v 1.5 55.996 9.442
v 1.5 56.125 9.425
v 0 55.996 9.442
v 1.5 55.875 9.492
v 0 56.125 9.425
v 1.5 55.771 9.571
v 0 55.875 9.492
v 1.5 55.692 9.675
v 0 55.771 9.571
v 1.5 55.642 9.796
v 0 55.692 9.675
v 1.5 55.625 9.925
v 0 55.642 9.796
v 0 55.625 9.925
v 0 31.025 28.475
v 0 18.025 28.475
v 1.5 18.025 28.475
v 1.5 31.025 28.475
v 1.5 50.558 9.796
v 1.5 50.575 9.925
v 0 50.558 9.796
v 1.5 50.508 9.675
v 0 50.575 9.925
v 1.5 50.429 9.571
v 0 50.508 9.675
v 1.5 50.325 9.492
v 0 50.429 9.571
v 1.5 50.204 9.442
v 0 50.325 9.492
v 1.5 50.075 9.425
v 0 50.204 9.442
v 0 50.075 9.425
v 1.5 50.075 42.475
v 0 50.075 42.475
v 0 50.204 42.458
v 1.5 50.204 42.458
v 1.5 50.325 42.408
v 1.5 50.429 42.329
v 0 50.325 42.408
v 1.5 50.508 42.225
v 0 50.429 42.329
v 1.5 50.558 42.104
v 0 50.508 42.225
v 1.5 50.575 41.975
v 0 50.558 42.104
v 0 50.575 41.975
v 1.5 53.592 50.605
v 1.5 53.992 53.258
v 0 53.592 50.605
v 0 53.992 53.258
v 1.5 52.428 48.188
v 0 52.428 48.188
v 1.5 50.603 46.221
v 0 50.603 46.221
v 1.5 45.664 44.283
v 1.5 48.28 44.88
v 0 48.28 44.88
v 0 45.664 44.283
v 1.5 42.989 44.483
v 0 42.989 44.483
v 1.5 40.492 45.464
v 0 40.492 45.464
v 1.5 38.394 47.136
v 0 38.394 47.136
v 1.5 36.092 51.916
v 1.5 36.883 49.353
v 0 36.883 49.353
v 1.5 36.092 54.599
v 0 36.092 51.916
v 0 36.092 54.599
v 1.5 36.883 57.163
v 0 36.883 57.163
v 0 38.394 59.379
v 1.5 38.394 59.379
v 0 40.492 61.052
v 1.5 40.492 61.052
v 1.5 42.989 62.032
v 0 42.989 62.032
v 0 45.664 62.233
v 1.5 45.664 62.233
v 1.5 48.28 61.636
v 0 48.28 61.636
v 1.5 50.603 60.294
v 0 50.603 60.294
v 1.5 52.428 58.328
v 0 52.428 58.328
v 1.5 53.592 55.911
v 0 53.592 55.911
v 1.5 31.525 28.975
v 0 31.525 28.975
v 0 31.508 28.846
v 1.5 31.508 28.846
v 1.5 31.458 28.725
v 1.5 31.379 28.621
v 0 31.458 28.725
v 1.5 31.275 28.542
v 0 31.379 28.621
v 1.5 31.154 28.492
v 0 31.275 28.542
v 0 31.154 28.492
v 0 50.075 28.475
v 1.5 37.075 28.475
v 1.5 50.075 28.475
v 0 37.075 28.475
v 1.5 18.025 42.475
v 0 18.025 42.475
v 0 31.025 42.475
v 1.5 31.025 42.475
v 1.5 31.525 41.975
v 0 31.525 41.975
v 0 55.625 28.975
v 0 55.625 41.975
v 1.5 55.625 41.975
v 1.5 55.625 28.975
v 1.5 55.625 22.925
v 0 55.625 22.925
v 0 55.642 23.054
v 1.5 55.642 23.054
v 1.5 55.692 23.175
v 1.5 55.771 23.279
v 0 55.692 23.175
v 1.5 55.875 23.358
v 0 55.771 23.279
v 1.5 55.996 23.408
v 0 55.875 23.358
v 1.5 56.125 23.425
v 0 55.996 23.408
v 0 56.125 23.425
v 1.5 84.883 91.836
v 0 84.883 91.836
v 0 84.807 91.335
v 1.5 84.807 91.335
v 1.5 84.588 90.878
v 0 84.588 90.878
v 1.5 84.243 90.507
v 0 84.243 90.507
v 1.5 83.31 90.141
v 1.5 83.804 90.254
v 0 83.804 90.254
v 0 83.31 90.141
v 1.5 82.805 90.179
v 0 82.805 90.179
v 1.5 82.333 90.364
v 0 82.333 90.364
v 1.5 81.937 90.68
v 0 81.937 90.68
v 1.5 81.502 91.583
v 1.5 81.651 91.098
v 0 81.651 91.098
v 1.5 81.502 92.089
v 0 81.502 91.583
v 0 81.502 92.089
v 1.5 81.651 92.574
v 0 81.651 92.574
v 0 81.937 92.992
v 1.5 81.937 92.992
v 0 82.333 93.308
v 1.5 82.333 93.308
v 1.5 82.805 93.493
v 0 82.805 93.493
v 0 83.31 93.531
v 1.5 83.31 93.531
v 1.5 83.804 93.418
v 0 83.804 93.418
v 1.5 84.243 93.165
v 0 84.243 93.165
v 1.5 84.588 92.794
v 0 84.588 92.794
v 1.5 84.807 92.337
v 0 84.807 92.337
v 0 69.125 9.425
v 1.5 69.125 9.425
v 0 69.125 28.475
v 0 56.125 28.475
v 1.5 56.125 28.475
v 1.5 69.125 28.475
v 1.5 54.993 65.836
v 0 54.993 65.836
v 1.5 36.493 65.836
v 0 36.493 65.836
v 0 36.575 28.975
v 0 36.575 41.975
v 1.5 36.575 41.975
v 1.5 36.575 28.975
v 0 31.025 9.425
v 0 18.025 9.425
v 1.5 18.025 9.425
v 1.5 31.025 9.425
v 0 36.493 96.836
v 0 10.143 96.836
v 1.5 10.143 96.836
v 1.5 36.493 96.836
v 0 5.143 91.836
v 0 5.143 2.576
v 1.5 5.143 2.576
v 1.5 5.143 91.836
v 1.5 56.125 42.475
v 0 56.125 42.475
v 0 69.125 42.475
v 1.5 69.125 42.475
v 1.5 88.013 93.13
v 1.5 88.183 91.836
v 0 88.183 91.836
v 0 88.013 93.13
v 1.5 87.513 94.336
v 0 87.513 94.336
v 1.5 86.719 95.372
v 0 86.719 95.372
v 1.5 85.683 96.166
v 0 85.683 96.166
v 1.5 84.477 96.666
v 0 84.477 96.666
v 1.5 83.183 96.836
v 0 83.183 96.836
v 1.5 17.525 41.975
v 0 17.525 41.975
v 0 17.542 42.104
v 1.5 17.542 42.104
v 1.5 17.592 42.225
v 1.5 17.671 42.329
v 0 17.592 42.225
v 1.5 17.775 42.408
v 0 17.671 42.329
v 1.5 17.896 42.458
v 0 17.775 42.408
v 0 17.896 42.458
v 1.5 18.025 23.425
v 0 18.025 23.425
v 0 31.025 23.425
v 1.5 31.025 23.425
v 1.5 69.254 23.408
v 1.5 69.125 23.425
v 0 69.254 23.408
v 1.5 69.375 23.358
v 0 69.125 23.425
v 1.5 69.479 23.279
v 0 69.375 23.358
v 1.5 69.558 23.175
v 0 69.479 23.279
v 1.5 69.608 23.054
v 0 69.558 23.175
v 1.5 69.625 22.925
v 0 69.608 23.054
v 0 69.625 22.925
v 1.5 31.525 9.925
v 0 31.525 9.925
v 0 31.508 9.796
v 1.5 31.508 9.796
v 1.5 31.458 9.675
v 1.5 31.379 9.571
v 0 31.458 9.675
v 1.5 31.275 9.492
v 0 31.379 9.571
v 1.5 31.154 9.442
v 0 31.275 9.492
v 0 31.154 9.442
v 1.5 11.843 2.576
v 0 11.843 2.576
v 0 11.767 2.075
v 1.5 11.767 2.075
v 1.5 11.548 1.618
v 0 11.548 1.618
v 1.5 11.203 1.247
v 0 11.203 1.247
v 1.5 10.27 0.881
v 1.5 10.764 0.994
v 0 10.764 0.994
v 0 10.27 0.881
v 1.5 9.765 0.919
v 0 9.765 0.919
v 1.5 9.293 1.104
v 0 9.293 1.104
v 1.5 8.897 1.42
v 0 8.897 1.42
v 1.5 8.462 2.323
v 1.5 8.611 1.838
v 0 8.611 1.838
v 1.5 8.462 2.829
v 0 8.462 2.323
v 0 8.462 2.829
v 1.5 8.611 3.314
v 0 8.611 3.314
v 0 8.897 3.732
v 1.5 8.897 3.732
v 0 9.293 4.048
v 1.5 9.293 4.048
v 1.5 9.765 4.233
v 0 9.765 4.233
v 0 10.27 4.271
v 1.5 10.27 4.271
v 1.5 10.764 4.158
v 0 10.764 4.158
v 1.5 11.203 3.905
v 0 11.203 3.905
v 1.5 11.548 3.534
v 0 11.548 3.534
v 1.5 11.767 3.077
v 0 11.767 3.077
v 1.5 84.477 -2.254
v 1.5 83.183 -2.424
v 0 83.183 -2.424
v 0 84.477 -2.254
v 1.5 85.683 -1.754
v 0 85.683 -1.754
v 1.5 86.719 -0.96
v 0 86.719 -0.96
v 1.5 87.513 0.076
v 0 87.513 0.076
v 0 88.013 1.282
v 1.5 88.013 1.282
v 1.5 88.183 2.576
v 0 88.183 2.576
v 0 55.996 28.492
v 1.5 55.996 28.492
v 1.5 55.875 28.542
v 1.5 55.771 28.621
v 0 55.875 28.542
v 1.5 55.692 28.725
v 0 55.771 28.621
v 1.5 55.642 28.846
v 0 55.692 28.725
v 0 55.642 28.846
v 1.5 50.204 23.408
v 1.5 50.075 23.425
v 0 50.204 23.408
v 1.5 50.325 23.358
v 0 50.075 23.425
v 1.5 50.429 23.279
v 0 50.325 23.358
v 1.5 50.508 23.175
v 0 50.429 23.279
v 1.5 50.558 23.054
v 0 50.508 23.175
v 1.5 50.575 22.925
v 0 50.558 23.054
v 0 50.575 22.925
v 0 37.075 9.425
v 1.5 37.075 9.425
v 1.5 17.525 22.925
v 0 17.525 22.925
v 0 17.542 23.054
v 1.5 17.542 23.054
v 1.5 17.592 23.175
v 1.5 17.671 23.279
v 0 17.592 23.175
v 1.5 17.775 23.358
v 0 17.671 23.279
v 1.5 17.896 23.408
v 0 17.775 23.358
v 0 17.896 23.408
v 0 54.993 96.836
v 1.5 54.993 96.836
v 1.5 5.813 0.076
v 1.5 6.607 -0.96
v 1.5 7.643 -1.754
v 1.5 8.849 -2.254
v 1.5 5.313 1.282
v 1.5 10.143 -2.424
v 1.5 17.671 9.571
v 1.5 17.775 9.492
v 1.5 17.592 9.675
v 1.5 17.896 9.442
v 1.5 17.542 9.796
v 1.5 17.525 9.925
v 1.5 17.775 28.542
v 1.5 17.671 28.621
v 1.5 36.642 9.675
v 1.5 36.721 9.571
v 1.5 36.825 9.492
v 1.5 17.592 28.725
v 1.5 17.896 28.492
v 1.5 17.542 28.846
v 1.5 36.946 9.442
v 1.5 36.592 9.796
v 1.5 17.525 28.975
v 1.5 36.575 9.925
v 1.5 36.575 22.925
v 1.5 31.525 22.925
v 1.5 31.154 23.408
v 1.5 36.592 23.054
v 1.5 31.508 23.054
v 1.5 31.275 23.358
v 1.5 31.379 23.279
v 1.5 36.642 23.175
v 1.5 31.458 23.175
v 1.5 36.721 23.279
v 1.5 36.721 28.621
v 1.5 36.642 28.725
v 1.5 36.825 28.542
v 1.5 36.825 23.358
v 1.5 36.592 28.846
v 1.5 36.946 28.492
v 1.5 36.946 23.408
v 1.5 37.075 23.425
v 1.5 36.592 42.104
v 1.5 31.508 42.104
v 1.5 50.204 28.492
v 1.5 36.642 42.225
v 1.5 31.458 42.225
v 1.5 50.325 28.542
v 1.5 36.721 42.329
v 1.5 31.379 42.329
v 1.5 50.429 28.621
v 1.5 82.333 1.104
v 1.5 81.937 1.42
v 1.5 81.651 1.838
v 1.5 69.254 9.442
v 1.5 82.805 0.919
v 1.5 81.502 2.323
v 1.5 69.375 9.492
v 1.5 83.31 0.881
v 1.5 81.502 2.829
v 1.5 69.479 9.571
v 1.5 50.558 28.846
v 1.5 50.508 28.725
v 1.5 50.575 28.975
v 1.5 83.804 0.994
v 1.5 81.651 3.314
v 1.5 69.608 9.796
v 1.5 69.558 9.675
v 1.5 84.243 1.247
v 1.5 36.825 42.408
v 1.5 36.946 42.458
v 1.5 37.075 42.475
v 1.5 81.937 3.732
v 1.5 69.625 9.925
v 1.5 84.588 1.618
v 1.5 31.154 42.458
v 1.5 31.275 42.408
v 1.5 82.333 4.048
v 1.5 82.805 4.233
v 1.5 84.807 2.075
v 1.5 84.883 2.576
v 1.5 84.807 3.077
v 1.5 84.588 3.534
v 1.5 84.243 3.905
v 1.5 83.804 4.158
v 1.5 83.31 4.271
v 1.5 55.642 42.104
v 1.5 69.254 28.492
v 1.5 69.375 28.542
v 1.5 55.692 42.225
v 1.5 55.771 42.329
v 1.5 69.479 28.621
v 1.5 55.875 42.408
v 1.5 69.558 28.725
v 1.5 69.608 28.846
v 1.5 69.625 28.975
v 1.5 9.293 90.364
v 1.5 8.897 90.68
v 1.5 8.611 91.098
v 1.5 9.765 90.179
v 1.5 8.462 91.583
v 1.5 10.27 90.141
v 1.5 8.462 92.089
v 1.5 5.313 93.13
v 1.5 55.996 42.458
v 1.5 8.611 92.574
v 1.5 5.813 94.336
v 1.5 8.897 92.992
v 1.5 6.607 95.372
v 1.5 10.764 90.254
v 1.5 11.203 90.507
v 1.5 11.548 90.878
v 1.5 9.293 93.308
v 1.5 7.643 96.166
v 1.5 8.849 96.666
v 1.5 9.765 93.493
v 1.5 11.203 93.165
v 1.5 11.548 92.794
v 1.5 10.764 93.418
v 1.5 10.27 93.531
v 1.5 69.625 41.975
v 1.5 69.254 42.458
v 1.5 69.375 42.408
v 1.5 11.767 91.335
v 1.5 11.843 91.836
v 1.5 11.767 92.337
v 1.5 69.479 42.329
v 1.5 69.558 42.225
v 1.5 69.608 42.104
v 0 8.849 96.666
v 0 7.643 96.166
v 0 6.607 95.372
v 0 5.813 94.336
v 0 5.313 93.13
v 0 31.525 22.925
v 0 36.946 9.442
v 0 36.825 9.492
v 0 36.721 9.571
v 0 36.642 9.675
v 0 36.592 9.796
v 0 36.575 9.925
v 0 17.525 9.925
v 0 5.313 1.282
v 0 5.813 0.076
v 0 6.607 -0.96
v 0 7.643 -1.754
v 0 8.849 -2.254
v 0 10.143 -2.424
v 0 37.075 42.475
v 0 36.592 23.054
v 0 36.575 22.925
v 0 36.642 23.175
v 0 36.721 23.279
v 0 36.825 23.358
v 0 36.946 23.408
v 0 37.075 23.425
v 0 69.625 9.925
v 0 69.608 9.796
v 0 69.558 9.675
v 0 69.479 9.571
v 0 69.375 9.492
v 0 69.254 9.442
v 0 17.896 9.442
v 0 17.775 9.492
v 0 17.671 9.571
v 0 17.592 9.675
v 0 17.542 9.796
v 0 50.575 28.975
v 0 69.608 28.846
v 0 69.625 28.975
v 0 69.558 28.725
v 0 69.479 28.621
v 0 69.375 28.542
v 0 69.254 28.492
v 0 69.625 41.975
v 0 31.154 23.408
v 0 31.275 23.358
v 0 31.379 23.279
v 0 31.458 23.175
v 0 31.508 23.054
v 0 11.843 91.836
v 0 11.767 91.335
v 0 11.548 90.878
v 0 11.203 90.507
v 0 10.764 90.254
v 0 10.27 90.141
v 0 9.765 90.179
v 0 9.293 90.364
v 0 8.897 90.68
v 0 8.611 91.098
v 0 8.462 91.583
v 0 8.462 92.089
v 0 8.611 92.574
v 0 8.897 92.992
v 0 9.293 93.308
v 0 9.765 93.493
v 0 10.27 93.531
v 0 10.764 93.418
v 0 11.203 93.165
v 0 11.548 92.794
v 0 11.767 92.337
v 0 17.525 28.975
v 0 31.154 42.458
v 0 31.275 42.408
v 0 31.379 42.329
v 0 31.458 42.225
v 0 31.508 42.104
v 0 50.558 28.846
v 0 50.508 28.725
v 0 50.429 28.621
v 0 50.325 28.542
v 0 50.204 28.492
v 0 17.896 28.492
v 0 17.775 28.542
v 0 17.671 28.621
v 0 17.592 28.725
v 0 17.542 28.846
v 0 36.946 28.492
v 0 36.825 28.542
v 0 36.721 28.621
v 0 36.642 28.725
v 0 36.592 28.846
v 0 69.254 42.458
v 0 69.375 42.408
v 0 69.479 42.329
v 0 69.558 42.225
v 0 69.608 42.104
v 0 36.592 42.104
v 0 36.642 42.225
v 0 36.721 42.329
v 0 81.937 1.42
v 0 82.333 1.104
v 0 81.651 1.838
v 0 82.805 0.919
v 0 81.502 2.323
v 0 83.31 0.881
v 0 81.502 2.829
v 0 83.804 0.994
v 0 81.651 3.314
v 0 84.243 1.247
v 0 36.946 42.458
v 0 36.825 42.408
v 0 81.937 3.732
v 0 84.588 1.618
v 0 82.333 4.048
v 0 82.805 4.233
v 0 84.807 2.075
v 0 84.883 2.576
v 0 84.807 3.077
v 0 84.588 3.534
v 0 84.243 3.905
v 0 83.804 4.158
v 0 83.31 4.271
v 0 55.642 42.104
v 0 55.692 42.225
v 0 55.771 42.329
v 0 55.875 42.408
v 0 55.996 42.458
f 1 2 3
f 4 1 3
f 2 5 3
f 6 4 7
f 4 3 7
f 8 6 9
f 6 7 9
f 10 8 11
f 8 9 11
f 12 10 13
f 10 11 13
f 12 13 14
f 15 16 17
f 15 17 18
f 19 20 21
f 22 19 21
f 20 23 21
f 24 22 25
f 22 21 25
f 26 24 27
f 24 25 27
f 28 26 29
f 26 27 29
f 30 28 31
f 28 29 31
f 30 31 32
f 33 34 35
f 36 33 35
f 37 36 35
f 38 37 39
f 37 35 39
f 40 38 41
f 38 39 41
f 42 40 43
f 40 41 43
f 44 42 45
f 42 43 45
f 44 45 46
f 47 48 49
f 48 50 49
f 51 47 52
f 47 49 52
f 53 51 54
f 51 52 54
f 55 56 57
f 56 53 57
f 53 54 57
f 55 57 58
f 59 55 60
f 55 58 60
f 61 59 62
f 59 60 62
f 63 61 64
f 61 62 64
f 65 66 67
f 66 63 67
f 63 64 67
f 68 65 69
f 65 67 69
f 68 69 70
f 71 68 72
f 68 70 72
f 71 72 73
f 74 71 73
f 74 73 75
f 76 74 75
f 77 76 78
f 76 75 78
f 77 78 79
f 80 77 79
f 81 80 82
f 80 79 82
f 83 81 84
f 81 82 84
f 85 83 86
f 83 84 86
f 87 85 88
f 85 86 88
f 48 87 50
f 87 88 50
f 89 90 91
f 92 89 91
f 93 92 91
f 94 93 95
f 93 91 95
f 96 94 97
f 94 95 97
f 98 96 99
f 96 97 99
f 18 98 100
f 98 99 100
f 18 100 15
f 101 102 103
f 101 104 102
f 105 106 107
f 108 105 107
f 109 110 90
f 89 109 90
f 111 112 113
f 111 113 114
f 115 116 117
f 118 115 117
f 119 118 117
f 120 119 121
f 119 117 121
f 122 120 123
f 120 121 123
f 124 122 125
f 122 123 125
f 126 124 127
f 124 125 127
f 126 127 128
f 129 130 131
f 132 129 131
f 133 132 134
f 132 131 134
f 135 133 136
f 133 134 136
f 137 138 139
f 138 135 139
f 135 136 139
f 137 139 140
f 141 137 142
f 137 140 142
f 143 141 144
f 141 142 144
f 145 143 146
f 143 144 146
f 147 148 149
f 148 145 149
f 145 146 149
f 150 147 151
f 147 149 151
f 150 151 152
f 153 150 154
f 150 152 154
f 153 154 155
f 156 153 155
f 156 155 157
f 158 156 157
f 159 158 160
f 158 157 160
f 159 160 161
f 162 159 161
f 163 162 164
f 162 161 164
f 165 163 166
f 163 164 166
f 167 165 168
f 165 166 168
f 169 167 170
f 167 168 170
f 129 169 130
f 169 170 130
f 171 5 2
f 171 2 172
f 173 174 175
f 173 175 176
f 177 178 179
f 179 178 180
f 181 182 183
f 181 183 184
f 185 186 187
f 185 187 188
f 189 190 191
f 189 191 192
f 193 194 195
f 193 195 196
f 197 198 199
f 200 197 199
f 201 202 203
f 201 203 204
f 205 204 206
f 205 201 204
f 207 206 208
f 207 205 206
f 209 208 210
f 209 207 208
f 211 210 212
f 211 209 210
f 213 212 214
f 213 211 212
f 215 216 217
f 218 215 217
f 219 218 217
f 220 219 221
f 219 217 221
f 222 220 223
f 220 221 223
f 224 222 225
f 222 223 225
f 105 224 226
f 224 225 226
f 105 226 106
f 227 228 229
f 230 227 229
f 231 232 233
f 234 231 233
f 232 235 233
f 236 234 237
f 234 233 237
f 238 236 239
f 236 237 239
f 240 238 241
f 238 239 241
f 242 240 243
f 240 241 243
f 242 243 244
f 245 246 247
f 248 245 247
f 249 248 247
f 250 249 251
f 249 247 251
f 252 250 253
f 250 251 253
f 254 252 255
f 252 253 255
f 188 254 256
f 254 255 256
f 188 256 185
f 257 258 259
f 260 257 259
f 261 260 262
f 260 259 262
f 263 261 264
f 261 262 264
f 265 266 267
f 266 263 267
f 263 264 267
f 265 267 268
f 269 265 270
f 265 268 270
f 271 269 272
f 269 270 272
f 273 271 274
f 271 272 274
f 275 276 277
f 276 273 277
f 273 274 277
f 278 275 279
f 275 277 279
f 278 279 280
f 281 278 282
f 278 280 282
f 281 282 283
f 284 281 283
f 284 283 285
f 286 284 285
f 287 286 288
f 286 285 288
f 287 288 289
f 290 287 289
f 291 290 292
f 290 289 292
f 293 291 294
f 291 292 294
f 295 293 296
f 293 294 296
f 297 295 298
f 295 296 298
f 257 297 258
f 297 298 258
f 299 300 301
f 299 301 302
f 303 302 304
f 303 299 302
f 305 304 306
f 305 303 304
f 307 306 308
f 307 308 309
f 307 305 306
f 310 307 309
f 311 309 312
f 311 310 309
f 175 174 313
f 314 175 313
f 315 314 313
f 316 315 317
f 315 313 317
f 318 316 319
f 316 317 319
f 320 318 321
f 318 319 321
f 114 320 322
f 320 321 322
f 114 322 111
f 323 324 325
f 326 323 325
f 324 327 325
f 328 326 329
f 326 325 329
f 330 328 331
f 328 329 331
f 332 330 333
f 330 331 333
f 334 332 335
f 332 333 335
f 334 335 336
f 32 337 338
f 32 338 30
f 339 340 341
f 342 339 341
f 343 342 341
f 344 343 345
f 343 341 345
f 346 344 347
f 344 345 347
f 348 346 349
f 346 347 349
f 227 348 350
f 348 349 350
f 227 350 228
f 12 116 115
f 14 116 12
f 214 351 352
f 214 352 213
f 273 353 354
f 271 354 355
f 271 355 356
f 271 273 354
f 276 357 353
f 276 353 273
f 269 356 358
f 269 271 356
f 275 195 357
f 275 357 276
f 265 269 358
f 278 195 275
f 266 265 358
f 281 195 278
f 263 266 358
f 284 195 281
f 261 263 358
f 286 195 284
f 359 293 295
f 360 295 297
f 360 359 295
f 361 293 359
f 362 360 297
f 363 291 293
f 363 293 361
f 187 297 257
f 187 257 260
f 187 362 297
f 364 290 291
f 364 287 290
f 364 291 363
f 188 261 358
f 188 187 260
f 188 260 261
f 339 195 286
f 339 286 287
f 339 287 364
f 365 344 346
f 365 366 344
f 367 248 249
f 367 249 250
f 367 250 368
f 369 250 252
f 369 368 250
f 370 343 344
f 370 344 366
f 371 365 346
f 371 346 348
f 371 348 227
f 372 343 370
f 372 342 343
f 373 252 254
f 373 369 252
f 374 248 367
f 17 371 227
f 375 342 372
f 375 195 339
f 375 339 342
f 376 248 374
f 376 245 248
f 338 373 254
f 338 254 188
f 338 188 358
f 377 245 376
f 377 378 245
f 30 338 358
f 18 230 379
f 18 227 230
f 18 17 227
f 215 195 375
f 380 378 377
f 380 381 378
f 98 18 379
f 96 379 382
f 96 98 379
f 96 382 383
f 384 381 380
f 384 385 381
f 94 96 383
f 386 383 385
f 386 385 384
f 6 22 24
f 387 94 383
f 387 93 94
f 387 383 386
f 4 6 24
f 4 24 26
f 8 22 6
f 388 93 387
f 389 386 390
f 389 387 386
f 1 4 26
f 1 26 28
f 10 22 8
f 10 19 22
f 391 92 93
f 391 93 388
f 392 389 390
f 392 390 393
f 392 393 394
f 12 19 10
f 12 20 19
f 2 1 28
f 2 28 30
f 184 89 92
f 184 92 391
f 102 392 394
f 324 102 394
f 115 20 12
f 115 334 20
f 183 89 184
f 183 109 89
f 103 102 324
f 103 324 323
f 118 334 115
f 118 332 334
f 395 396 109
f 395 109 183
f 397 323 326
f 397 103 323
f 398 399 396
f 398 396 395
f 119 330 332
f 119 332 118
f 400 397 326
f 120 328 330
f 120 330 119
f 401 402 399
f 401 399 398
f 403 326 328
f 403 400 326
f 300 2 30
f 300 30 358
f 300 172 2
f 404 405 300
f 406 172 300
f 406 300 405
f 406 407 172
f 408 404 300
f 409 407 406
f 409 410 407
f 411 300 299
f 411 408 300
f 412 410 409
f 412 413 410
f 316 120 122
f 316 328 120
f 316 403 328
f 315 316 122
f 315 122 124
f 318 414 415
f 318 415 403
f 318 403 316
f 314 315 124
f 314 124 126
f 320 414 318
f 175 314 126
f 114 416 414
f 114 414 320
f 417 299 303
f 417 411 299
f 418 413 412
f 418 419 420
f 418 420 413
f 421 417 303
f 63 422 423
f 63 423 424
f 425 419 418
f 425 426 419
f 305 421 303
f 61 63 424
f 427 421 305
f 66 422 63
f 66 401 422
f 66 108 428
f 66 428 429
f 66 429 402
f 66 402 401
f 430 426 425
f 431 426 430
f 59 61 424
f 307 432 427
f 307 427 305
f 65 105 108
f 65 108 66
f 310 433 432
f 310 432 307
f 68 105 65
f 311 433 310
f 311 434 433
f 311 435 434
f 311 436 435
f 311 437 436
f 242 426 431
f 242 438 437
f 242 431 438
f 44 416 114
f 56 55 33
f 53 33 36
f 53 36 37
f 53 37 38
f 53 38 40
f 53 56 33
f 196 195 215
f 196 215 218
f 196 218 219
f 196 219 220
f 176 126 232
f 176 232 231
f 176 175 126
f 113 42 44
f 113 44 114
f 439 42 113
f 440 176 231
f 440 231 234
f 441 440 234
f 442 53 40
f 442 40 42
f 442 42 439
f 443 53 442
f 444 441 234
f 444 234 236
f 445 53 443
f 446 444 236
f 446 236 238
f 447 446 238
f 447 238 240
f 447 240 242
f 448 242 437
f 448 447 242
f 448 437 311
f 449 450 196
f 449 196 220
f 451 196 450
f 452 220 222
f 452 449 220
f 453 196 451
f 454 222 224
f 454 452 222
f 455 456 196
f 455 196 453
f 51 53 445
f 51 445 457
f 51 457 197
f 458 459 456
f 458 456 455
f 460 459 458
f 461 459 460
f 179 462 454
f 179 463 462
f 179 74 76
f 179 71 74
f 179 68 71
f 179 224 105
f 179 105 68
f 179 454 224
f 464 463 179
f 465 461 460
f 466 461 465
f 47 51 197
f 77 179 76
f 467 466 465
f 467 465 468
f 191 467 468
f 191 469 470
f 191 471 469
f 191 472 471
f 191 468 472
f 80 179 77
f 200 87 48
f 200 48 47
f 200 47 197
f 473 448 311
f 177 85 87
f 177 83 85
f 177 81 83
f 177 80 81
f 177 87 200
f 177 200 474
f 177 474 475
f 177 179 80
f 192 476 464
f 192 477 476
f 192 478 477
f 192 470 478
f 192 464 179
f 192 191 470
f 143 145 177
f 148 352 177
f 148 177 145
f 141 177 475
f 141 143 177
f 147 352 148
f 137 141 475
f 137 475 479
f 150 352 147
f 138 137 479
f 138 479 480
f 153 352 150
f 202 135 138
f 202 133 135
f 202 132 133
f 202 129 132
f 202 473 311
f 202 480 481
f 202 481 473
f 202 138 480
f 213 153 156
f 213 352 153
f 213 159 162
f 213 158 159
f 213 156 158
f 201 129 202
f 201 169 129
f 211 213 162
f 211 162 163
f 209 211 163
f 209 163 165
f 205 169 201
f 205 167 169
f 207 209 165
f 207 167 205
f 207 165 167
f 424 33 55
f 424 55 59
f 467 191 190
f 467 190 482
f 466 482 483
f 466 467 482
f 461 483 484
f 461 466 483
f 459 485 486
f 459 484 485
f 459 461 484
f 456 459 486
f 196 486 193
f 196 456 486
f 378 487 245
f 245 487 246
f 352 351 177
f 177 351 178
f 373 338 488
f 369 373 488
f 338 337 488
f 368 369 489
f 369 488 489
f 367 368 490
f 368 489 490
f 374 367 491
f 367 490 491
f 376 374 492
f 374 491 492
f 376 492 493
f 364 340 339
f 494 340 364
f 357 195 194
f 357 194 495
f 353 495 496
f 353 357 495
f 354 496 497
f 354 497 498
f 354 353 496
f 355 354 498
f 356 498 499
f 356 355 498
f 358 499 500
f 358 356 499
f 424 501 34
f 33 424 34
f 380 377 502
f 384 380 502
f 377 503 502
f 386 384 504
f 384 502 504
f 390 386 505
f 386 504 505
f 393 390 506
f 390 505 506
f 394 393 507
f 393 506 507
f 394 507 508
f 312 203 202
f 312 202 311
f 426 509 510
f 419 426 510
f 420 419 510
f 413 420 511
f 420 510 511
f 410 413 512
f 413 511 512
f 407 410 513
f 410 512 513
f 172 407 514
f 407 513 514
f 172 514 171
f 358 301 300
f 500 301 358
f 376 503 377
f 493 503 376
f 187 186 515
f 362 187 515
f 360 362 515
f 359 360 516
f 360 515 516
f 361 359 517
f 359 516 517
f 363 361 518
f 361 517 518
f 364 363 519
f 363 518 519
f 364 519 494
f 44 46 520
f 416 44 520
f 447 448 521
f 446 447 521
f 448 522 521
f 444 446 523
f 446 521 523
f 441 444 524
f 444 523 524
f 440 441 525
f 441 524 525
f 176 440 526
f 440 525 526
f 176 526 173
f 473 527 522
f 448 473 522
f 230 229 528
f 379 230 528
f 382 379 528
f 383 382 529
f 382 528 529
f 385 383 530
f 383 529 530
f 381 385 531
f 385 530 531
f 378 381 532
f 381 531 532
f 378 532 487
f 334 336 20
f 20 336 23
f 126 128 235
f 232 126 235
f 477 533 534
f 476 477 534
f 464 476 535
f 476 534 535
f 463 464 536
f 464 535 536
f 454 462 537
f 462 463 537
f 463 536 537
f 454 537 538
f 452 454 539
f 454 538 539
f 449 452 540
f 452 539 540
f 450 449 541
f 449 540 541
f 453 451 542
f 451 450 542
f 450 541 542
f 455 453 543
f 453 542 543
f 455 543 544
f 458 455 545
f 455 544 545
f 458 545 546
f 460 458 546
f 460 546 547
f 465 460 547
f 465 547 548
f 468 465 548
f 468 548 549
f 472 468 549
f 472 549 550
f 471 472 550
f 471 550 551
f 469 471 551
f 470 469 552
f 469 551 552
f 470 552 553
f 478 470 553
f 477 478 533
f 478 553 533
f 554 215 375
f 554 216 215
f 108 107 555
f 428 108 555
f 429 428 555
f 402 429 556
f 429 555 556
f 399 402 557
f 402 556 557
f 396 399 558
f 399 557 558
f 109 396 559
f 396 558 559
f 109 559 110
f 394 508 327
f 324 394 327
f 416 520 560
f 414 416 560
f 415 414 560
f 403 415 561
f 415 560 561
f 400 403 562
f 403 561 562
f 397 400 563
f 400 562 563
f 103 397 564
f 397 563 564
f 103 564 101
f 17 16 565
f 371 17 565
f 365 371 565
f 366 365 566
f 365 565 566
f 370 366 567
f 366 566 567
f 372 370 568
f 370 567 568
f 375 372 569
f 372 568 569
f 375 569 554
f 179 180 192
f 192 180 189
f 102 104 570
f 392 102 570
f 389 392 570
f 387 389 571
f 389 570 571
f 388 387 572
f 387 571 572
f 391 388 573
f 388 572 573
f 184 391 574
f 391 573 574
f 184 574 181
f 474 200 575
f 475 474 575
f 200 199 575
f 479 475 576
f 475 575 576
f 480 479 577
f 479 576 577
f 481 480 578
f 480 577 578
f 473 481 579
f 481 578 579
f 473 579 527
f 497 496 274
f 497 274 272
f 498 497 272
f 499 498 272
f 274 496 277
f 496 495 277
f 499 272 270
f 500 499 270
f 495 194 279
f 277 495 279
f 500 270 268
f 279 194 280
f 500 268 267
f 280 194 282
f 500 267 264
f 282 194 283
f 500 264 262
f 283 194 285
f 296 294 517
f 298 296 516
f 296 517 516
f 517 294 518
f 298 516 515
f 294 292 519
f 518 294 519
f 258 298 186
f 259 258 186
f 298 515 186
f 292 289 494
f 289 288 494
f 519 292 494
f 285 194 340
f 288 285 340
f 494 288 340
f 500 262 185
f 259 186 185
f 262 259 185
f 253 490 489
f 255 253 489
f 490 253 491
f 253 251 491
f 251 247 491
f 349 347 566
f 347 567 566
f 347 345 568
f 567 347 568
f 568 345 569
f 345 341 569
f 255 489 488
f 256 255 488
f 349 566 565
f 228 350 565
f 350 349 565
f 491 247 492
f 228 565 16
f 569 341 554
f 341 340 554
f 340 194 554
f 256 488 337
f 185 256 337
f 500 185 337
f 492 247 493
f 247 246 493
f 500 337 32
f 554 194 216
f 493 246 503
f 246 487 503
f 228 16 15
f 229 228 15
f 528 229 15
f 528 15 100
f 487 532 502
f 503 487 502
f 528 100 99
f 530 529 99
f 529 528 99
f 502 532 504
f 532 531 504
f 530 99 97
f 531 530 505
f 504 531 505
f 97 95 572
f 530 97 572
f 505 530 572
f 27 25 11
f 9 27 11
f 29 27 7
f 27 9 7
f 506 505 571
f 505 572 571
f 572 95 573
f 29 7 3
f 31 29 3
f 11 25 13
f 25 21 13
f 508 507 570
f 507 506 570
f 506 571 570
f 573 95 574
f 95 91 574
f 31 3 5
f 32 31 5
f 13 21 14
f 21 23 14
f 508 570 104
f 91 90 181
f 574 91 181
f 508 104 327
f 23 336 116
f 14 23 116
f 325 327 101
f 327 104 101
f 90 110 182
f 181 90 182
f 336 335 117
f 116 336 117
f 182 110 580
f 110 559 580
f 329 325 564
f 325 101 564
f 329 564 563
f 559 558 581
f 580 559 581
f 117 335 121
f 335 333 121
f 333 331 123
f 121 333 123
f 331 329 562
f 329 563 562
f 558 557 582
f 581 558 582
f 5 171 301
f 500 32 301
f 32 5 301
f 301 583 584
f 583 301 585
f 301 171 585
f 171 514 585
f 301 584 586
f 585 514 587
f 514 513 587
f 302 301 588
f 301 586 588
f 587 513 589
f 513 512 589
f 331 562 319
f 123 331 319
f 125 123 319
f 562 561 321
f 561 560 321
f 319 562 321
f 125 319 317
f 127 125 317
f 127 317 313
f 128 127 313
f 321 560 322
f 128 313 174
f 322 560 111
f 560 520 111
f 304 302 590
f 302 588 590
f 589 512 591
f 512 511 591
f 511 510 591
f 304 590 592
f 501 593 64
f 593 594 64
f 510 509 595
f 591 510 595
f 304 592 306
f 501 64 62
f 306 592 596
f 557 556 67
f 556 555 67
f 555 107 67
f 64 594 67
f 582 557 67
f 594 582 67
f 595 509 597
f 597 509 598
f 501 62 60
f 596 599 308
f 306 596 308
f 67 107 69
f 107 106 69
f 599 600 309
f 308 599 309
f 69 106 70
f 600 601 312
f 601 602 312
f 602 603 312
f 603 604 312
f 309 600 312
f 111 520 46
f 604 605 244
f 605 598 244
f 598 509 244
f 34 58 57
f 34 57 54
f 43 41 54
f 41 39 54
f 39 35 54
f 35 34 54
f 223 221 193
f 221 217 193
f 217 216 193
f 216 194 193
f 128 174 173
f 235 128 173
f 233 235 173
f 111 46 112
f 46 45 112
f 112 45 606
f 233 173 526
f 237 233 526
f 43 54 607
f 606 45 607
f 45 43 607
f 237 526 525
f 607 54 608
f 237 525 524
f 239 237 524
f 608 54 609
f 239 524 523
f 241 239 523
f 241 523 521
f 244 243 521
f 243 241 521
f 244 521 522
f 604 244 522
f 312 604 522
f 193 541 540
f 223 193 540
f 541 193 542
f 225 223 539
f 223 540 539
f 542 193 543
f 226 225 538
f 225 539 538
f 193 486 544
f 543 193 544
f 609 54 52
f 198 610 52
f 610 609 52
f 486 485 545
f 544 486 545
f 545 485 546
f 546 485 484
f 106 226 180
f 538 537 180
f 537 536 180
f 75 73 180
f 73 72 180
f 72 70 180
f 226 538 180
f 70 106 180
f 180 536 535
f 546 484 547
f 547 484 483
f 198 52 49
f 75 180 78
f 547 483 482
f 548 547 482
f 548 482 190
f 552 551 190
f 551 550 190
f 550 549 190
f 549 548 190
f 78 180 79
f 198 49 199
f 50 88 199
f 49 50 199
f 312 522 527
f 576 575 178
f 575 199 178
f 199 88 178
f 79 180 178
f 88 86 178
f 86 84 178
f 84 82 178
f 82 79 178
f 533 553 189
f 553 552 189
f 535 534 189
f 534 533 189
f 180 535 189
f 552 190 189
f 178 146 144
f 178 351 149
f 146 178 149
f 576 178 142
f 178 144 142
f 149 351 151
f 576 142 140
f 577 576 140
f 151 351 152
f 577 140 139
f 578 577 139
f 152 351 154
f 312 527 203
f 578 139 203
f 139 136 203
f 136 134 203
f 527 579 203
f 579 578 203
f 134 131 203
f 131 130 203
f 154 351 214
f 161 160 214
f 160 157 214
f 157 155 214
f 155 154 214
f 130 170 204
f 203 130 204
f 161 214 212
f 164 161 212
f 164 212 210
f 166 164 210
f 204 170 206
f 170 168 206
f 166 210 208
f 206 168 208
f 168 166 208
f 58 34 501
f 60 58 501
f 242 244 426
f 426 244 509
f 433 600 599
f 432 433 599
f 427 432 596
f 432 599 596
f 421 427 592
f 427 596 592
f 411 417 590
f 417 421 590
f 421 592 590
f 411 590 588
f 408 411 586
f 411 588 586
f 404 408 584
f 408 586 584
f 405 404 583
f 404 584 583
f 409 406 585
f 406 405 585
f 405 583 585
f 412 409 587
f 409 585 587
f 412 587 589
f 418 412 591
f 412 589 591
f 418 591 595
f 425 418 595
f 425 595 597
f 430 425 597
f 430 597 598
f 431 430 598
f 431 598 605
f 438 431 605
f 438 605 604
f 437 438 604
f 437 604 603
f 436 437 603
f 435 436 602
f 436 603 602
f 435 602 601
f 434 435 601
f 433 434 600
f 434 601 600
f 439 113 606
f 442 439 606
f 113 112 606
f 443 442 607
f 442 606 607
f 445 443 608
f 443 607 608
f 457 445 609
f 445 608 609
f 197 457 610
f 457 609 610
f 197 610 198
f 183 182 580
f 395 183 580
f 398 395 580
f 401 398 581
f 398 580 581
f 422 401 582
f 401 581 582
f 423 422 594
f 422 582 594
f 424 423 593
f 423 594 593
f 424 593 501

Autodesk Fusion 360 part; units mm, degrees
sketch "plate-2025-12-20T19_09_56.435Z" plane through (0, 0, 0) normal (1, 0, 0) x (0, 1, 0)
sketch "plate-2025-12-20T19_09_56.435Z (1)" plane through (0, 0, 0) normal (1, 0, 0) x (0, 1, 0)
  line L0 (18.025, 42.475) -> (31.025, 42.475)
  line L1 (18.025, 28.475) -> (31.025, 28.475)
  line L2 (17.525, 41.975) -> (17.525, 28.975)
  line L3 (31.525, 41.975) -> (31.525, 28.975)
  arc A0 (18.025, 42.475) -> (17.525, 41.975) centre (18.025, 41.975) ccw
  arc A1 (31.525, 41.975) -> (31.025, 42.475) centre (31.025, 41.975) ccw
  arc A2 (17.525, 28.975) -> (18.025, 28.475) centre (18.025, 28.975) ccw
  arc A3 (31.025, 28.475) -> (31.525, 28.975) centre (31.025, 28.975) ccw
  line L4 (37.075, 42.475) -> (50.075, 42.475)
  line L5 (37.075, 28.475) -> (50.075, 28.475)
  line L6 (36.575, 41.975) -> (36.575, 28.975)
  line L7 (50.575, 41.975) -> (50.575, 28.975)
  arc A4 (37.075, 42.475) -> (36.575, 41.975) centre (37.075, 41.975) ccw
  arc A5 (50.575, 41.975) -> (50.075, 42.475) centre (50.075, 41.975) ccw
  arc A6 (36.575, 28.975) -> (37.075, 28.475) centre (37.075, 28.975) ccw
  arc A7 (50.075, 28.475) -> (50.575, 28.975) centre (50.075, 28.975) ccw
  line L8 (56.125, 42.475) -> (69.125, 42.475)
  line L9 (56.125, 28.475) -> (69.125, 28.475)
  line L10 (55.625, 41.975) -> (55.625, 28.975)
  line L11 (69.625, 41.975) -> (69.625, 28.975)
  arc A8 (56.125, 42.475) -> (55.625, 41.975) centre (56.125, 41.975) ccw
  arc A9 (69.625, 41.975) -> (69.125, 42.475) centre (69.125, 41.975) ccw
  arc A10 (55.625, 28.975) -> (56.125, 28.475) centre (56.125, 28.975) ccw
  arc A11 (69.125, 28.475) -> (69.625, 28.975) centre (69.125, 28.975) ccw
  line L12 (18.025, 23.425) -> (31.025, 23.425)
  line L13 (18.025, 9.425) -> (31.025, 9.425)
  line L14 (17.525, 22.925) -> (17.525, 9.925)
  line L15 (31.525, 22.925) -> (31.525, 9.925)
  arc A12 (18.025, 23.425) -> (17.525, 22.925) centre (18.025, 22.925) ccw
  arc A13 (31.525, 22.925) -> (31.025, 23.425) centre (31.025, 22.925) ccw
  arc A14 (17.525, 9.925) -> (18.025, 9.425) centre (18.025, 9.925) ccw
  arc A15 (31.025, 9.425) -> (31.525, 9.925) centre (31.025, 9.925) ccw
  line L16 (37.075, 23.425) -> (50.075, 23.425)
  line L17 (37.075, 9.425) -> (50.075, 9.425)
  line L18 (36.575, 22.925) -> (36.575, 9.925)
  line L19 (50.575, 22.925) -> (50.575, 9.925)
  arc A16 (37.075, 23.425) -> (36.575, 22.925) centre (37.075, 22.925) ccw
  arc A17 (50.575, 22.925) -> (50.075, 23.425) centre (50.075, 22.925) ccw
  arc A18 (36.575, 9.925) -> (37.075, 9.425) centre (37.075, 9.925) ccw
  arc A19 (50.075, 9.425) -> (50.575, 9.925) centre (50.075, 9.925) ccw
  line L20 (56.125, 23.425) -> (69.125, 23.425)
  line L21 (56.125, 9.425) -> (69.125, 9.425)
  line L22 (55.625, 22.925) -> (55.625, 9.925)
  line L23 (69.625, 22.925) -> (69.625, 9.925)
  arc A20 (56.125, 23.425) -> (55.625, 22.925) centre (56.125, 22.925) ccw
  arc A21 (69.625, 22.925) -> (69.125, 23.425) centre (69.125, 22.925) ccw
  arc A22 (55.625, 9.925) -> (56.125, 9.425) centre (56.125, 9.925) ccw
  arc A23 (69.125, 9.425) -> (69.625, 9.925) centre (69.125, 9.925) ccw
sketch "Sketch3" plane through (0, 0, 0) normal (1, 0, 0) x (0, 1, 0)
  line L0 (5.143, 96.836) -> (88.183, 96.836)
  line L1 (88.183, 96.836) -> (88.183, -2.424)
  line L2 (88.183, -2.424) -> (5.143, -2.424)
  line L3 (5.143, -2.424) -> (5.143, 96.836)
  line L4 (18.025, 9.425) -> (31.025, 9.425)
  line L5 (17.525, 22.925) -> (17.525, 9.925)
  line L6 (36.493, 96.836) -> (54.993, 96.836)
  line L7 (54.993, 96.836) -> (54.993, 65.836)
  line L8 (54.993, 65.836) -> (36.493, 65.836)
  line L9 (36.493, 65.836) -> (36.493, 96.836)
  circle A0 centre (10.143, 2.576) radius 1.7
  circle A1 centre (83.183, 2.576) radius 1.7
  circle A2 centre (10.143, 91.836) radius 1.7
  circle A3 centre (83.183, 91.836) radius 1.7
  circle A4 centre (44.9917, 53.2578) radius 9
  dimension "d1" = 83.04
  dimension "d2" = 99.26
  dimension "d3" = 11.849
  dimension "d4" = 12.382
  dimension "d5" = 31
  dimension "d6" = 18.5
  dimension "d7" = 31.35
  dimension "d8" = 3.4
  dimension "d9" = 3.4
  dimension "d10" = 5
  dimension "d11" = 5
  dimension "d12" = 5
  dimension "d13" = 5
  dimension "d14" = 3.4
  dimension "d15" = 3.4
  dimension "d16" = 5
  dimension "d17" = 5
  dimension "d18" = 5
  dimension "d19" = 5
  dimension "d20" = 18
  dimension "d21" = 39.8487
extrude "Extrude1" add sketch "Sketch3" along normal blind 1.5 contours L0 L1 L2 L3 L7 L8 L9
extrude "Extrude2" cut sketch "plate-2025-12-20T19_09_56.435Z (1)" along normal through all
fillet "Fillet1" radius 5 1 edges at (0.75, 88.183, 96.836)
fillet "Fillet2" radius 5 1 edges at (0.75, 5.143, 96.836)
fillet "Fillet3" radius 5 1 edges at (0.75, 5.143, -2.424)
fillet "Fillet4" radius 5 1 edges at (0.75, 88.183, -2.424)
